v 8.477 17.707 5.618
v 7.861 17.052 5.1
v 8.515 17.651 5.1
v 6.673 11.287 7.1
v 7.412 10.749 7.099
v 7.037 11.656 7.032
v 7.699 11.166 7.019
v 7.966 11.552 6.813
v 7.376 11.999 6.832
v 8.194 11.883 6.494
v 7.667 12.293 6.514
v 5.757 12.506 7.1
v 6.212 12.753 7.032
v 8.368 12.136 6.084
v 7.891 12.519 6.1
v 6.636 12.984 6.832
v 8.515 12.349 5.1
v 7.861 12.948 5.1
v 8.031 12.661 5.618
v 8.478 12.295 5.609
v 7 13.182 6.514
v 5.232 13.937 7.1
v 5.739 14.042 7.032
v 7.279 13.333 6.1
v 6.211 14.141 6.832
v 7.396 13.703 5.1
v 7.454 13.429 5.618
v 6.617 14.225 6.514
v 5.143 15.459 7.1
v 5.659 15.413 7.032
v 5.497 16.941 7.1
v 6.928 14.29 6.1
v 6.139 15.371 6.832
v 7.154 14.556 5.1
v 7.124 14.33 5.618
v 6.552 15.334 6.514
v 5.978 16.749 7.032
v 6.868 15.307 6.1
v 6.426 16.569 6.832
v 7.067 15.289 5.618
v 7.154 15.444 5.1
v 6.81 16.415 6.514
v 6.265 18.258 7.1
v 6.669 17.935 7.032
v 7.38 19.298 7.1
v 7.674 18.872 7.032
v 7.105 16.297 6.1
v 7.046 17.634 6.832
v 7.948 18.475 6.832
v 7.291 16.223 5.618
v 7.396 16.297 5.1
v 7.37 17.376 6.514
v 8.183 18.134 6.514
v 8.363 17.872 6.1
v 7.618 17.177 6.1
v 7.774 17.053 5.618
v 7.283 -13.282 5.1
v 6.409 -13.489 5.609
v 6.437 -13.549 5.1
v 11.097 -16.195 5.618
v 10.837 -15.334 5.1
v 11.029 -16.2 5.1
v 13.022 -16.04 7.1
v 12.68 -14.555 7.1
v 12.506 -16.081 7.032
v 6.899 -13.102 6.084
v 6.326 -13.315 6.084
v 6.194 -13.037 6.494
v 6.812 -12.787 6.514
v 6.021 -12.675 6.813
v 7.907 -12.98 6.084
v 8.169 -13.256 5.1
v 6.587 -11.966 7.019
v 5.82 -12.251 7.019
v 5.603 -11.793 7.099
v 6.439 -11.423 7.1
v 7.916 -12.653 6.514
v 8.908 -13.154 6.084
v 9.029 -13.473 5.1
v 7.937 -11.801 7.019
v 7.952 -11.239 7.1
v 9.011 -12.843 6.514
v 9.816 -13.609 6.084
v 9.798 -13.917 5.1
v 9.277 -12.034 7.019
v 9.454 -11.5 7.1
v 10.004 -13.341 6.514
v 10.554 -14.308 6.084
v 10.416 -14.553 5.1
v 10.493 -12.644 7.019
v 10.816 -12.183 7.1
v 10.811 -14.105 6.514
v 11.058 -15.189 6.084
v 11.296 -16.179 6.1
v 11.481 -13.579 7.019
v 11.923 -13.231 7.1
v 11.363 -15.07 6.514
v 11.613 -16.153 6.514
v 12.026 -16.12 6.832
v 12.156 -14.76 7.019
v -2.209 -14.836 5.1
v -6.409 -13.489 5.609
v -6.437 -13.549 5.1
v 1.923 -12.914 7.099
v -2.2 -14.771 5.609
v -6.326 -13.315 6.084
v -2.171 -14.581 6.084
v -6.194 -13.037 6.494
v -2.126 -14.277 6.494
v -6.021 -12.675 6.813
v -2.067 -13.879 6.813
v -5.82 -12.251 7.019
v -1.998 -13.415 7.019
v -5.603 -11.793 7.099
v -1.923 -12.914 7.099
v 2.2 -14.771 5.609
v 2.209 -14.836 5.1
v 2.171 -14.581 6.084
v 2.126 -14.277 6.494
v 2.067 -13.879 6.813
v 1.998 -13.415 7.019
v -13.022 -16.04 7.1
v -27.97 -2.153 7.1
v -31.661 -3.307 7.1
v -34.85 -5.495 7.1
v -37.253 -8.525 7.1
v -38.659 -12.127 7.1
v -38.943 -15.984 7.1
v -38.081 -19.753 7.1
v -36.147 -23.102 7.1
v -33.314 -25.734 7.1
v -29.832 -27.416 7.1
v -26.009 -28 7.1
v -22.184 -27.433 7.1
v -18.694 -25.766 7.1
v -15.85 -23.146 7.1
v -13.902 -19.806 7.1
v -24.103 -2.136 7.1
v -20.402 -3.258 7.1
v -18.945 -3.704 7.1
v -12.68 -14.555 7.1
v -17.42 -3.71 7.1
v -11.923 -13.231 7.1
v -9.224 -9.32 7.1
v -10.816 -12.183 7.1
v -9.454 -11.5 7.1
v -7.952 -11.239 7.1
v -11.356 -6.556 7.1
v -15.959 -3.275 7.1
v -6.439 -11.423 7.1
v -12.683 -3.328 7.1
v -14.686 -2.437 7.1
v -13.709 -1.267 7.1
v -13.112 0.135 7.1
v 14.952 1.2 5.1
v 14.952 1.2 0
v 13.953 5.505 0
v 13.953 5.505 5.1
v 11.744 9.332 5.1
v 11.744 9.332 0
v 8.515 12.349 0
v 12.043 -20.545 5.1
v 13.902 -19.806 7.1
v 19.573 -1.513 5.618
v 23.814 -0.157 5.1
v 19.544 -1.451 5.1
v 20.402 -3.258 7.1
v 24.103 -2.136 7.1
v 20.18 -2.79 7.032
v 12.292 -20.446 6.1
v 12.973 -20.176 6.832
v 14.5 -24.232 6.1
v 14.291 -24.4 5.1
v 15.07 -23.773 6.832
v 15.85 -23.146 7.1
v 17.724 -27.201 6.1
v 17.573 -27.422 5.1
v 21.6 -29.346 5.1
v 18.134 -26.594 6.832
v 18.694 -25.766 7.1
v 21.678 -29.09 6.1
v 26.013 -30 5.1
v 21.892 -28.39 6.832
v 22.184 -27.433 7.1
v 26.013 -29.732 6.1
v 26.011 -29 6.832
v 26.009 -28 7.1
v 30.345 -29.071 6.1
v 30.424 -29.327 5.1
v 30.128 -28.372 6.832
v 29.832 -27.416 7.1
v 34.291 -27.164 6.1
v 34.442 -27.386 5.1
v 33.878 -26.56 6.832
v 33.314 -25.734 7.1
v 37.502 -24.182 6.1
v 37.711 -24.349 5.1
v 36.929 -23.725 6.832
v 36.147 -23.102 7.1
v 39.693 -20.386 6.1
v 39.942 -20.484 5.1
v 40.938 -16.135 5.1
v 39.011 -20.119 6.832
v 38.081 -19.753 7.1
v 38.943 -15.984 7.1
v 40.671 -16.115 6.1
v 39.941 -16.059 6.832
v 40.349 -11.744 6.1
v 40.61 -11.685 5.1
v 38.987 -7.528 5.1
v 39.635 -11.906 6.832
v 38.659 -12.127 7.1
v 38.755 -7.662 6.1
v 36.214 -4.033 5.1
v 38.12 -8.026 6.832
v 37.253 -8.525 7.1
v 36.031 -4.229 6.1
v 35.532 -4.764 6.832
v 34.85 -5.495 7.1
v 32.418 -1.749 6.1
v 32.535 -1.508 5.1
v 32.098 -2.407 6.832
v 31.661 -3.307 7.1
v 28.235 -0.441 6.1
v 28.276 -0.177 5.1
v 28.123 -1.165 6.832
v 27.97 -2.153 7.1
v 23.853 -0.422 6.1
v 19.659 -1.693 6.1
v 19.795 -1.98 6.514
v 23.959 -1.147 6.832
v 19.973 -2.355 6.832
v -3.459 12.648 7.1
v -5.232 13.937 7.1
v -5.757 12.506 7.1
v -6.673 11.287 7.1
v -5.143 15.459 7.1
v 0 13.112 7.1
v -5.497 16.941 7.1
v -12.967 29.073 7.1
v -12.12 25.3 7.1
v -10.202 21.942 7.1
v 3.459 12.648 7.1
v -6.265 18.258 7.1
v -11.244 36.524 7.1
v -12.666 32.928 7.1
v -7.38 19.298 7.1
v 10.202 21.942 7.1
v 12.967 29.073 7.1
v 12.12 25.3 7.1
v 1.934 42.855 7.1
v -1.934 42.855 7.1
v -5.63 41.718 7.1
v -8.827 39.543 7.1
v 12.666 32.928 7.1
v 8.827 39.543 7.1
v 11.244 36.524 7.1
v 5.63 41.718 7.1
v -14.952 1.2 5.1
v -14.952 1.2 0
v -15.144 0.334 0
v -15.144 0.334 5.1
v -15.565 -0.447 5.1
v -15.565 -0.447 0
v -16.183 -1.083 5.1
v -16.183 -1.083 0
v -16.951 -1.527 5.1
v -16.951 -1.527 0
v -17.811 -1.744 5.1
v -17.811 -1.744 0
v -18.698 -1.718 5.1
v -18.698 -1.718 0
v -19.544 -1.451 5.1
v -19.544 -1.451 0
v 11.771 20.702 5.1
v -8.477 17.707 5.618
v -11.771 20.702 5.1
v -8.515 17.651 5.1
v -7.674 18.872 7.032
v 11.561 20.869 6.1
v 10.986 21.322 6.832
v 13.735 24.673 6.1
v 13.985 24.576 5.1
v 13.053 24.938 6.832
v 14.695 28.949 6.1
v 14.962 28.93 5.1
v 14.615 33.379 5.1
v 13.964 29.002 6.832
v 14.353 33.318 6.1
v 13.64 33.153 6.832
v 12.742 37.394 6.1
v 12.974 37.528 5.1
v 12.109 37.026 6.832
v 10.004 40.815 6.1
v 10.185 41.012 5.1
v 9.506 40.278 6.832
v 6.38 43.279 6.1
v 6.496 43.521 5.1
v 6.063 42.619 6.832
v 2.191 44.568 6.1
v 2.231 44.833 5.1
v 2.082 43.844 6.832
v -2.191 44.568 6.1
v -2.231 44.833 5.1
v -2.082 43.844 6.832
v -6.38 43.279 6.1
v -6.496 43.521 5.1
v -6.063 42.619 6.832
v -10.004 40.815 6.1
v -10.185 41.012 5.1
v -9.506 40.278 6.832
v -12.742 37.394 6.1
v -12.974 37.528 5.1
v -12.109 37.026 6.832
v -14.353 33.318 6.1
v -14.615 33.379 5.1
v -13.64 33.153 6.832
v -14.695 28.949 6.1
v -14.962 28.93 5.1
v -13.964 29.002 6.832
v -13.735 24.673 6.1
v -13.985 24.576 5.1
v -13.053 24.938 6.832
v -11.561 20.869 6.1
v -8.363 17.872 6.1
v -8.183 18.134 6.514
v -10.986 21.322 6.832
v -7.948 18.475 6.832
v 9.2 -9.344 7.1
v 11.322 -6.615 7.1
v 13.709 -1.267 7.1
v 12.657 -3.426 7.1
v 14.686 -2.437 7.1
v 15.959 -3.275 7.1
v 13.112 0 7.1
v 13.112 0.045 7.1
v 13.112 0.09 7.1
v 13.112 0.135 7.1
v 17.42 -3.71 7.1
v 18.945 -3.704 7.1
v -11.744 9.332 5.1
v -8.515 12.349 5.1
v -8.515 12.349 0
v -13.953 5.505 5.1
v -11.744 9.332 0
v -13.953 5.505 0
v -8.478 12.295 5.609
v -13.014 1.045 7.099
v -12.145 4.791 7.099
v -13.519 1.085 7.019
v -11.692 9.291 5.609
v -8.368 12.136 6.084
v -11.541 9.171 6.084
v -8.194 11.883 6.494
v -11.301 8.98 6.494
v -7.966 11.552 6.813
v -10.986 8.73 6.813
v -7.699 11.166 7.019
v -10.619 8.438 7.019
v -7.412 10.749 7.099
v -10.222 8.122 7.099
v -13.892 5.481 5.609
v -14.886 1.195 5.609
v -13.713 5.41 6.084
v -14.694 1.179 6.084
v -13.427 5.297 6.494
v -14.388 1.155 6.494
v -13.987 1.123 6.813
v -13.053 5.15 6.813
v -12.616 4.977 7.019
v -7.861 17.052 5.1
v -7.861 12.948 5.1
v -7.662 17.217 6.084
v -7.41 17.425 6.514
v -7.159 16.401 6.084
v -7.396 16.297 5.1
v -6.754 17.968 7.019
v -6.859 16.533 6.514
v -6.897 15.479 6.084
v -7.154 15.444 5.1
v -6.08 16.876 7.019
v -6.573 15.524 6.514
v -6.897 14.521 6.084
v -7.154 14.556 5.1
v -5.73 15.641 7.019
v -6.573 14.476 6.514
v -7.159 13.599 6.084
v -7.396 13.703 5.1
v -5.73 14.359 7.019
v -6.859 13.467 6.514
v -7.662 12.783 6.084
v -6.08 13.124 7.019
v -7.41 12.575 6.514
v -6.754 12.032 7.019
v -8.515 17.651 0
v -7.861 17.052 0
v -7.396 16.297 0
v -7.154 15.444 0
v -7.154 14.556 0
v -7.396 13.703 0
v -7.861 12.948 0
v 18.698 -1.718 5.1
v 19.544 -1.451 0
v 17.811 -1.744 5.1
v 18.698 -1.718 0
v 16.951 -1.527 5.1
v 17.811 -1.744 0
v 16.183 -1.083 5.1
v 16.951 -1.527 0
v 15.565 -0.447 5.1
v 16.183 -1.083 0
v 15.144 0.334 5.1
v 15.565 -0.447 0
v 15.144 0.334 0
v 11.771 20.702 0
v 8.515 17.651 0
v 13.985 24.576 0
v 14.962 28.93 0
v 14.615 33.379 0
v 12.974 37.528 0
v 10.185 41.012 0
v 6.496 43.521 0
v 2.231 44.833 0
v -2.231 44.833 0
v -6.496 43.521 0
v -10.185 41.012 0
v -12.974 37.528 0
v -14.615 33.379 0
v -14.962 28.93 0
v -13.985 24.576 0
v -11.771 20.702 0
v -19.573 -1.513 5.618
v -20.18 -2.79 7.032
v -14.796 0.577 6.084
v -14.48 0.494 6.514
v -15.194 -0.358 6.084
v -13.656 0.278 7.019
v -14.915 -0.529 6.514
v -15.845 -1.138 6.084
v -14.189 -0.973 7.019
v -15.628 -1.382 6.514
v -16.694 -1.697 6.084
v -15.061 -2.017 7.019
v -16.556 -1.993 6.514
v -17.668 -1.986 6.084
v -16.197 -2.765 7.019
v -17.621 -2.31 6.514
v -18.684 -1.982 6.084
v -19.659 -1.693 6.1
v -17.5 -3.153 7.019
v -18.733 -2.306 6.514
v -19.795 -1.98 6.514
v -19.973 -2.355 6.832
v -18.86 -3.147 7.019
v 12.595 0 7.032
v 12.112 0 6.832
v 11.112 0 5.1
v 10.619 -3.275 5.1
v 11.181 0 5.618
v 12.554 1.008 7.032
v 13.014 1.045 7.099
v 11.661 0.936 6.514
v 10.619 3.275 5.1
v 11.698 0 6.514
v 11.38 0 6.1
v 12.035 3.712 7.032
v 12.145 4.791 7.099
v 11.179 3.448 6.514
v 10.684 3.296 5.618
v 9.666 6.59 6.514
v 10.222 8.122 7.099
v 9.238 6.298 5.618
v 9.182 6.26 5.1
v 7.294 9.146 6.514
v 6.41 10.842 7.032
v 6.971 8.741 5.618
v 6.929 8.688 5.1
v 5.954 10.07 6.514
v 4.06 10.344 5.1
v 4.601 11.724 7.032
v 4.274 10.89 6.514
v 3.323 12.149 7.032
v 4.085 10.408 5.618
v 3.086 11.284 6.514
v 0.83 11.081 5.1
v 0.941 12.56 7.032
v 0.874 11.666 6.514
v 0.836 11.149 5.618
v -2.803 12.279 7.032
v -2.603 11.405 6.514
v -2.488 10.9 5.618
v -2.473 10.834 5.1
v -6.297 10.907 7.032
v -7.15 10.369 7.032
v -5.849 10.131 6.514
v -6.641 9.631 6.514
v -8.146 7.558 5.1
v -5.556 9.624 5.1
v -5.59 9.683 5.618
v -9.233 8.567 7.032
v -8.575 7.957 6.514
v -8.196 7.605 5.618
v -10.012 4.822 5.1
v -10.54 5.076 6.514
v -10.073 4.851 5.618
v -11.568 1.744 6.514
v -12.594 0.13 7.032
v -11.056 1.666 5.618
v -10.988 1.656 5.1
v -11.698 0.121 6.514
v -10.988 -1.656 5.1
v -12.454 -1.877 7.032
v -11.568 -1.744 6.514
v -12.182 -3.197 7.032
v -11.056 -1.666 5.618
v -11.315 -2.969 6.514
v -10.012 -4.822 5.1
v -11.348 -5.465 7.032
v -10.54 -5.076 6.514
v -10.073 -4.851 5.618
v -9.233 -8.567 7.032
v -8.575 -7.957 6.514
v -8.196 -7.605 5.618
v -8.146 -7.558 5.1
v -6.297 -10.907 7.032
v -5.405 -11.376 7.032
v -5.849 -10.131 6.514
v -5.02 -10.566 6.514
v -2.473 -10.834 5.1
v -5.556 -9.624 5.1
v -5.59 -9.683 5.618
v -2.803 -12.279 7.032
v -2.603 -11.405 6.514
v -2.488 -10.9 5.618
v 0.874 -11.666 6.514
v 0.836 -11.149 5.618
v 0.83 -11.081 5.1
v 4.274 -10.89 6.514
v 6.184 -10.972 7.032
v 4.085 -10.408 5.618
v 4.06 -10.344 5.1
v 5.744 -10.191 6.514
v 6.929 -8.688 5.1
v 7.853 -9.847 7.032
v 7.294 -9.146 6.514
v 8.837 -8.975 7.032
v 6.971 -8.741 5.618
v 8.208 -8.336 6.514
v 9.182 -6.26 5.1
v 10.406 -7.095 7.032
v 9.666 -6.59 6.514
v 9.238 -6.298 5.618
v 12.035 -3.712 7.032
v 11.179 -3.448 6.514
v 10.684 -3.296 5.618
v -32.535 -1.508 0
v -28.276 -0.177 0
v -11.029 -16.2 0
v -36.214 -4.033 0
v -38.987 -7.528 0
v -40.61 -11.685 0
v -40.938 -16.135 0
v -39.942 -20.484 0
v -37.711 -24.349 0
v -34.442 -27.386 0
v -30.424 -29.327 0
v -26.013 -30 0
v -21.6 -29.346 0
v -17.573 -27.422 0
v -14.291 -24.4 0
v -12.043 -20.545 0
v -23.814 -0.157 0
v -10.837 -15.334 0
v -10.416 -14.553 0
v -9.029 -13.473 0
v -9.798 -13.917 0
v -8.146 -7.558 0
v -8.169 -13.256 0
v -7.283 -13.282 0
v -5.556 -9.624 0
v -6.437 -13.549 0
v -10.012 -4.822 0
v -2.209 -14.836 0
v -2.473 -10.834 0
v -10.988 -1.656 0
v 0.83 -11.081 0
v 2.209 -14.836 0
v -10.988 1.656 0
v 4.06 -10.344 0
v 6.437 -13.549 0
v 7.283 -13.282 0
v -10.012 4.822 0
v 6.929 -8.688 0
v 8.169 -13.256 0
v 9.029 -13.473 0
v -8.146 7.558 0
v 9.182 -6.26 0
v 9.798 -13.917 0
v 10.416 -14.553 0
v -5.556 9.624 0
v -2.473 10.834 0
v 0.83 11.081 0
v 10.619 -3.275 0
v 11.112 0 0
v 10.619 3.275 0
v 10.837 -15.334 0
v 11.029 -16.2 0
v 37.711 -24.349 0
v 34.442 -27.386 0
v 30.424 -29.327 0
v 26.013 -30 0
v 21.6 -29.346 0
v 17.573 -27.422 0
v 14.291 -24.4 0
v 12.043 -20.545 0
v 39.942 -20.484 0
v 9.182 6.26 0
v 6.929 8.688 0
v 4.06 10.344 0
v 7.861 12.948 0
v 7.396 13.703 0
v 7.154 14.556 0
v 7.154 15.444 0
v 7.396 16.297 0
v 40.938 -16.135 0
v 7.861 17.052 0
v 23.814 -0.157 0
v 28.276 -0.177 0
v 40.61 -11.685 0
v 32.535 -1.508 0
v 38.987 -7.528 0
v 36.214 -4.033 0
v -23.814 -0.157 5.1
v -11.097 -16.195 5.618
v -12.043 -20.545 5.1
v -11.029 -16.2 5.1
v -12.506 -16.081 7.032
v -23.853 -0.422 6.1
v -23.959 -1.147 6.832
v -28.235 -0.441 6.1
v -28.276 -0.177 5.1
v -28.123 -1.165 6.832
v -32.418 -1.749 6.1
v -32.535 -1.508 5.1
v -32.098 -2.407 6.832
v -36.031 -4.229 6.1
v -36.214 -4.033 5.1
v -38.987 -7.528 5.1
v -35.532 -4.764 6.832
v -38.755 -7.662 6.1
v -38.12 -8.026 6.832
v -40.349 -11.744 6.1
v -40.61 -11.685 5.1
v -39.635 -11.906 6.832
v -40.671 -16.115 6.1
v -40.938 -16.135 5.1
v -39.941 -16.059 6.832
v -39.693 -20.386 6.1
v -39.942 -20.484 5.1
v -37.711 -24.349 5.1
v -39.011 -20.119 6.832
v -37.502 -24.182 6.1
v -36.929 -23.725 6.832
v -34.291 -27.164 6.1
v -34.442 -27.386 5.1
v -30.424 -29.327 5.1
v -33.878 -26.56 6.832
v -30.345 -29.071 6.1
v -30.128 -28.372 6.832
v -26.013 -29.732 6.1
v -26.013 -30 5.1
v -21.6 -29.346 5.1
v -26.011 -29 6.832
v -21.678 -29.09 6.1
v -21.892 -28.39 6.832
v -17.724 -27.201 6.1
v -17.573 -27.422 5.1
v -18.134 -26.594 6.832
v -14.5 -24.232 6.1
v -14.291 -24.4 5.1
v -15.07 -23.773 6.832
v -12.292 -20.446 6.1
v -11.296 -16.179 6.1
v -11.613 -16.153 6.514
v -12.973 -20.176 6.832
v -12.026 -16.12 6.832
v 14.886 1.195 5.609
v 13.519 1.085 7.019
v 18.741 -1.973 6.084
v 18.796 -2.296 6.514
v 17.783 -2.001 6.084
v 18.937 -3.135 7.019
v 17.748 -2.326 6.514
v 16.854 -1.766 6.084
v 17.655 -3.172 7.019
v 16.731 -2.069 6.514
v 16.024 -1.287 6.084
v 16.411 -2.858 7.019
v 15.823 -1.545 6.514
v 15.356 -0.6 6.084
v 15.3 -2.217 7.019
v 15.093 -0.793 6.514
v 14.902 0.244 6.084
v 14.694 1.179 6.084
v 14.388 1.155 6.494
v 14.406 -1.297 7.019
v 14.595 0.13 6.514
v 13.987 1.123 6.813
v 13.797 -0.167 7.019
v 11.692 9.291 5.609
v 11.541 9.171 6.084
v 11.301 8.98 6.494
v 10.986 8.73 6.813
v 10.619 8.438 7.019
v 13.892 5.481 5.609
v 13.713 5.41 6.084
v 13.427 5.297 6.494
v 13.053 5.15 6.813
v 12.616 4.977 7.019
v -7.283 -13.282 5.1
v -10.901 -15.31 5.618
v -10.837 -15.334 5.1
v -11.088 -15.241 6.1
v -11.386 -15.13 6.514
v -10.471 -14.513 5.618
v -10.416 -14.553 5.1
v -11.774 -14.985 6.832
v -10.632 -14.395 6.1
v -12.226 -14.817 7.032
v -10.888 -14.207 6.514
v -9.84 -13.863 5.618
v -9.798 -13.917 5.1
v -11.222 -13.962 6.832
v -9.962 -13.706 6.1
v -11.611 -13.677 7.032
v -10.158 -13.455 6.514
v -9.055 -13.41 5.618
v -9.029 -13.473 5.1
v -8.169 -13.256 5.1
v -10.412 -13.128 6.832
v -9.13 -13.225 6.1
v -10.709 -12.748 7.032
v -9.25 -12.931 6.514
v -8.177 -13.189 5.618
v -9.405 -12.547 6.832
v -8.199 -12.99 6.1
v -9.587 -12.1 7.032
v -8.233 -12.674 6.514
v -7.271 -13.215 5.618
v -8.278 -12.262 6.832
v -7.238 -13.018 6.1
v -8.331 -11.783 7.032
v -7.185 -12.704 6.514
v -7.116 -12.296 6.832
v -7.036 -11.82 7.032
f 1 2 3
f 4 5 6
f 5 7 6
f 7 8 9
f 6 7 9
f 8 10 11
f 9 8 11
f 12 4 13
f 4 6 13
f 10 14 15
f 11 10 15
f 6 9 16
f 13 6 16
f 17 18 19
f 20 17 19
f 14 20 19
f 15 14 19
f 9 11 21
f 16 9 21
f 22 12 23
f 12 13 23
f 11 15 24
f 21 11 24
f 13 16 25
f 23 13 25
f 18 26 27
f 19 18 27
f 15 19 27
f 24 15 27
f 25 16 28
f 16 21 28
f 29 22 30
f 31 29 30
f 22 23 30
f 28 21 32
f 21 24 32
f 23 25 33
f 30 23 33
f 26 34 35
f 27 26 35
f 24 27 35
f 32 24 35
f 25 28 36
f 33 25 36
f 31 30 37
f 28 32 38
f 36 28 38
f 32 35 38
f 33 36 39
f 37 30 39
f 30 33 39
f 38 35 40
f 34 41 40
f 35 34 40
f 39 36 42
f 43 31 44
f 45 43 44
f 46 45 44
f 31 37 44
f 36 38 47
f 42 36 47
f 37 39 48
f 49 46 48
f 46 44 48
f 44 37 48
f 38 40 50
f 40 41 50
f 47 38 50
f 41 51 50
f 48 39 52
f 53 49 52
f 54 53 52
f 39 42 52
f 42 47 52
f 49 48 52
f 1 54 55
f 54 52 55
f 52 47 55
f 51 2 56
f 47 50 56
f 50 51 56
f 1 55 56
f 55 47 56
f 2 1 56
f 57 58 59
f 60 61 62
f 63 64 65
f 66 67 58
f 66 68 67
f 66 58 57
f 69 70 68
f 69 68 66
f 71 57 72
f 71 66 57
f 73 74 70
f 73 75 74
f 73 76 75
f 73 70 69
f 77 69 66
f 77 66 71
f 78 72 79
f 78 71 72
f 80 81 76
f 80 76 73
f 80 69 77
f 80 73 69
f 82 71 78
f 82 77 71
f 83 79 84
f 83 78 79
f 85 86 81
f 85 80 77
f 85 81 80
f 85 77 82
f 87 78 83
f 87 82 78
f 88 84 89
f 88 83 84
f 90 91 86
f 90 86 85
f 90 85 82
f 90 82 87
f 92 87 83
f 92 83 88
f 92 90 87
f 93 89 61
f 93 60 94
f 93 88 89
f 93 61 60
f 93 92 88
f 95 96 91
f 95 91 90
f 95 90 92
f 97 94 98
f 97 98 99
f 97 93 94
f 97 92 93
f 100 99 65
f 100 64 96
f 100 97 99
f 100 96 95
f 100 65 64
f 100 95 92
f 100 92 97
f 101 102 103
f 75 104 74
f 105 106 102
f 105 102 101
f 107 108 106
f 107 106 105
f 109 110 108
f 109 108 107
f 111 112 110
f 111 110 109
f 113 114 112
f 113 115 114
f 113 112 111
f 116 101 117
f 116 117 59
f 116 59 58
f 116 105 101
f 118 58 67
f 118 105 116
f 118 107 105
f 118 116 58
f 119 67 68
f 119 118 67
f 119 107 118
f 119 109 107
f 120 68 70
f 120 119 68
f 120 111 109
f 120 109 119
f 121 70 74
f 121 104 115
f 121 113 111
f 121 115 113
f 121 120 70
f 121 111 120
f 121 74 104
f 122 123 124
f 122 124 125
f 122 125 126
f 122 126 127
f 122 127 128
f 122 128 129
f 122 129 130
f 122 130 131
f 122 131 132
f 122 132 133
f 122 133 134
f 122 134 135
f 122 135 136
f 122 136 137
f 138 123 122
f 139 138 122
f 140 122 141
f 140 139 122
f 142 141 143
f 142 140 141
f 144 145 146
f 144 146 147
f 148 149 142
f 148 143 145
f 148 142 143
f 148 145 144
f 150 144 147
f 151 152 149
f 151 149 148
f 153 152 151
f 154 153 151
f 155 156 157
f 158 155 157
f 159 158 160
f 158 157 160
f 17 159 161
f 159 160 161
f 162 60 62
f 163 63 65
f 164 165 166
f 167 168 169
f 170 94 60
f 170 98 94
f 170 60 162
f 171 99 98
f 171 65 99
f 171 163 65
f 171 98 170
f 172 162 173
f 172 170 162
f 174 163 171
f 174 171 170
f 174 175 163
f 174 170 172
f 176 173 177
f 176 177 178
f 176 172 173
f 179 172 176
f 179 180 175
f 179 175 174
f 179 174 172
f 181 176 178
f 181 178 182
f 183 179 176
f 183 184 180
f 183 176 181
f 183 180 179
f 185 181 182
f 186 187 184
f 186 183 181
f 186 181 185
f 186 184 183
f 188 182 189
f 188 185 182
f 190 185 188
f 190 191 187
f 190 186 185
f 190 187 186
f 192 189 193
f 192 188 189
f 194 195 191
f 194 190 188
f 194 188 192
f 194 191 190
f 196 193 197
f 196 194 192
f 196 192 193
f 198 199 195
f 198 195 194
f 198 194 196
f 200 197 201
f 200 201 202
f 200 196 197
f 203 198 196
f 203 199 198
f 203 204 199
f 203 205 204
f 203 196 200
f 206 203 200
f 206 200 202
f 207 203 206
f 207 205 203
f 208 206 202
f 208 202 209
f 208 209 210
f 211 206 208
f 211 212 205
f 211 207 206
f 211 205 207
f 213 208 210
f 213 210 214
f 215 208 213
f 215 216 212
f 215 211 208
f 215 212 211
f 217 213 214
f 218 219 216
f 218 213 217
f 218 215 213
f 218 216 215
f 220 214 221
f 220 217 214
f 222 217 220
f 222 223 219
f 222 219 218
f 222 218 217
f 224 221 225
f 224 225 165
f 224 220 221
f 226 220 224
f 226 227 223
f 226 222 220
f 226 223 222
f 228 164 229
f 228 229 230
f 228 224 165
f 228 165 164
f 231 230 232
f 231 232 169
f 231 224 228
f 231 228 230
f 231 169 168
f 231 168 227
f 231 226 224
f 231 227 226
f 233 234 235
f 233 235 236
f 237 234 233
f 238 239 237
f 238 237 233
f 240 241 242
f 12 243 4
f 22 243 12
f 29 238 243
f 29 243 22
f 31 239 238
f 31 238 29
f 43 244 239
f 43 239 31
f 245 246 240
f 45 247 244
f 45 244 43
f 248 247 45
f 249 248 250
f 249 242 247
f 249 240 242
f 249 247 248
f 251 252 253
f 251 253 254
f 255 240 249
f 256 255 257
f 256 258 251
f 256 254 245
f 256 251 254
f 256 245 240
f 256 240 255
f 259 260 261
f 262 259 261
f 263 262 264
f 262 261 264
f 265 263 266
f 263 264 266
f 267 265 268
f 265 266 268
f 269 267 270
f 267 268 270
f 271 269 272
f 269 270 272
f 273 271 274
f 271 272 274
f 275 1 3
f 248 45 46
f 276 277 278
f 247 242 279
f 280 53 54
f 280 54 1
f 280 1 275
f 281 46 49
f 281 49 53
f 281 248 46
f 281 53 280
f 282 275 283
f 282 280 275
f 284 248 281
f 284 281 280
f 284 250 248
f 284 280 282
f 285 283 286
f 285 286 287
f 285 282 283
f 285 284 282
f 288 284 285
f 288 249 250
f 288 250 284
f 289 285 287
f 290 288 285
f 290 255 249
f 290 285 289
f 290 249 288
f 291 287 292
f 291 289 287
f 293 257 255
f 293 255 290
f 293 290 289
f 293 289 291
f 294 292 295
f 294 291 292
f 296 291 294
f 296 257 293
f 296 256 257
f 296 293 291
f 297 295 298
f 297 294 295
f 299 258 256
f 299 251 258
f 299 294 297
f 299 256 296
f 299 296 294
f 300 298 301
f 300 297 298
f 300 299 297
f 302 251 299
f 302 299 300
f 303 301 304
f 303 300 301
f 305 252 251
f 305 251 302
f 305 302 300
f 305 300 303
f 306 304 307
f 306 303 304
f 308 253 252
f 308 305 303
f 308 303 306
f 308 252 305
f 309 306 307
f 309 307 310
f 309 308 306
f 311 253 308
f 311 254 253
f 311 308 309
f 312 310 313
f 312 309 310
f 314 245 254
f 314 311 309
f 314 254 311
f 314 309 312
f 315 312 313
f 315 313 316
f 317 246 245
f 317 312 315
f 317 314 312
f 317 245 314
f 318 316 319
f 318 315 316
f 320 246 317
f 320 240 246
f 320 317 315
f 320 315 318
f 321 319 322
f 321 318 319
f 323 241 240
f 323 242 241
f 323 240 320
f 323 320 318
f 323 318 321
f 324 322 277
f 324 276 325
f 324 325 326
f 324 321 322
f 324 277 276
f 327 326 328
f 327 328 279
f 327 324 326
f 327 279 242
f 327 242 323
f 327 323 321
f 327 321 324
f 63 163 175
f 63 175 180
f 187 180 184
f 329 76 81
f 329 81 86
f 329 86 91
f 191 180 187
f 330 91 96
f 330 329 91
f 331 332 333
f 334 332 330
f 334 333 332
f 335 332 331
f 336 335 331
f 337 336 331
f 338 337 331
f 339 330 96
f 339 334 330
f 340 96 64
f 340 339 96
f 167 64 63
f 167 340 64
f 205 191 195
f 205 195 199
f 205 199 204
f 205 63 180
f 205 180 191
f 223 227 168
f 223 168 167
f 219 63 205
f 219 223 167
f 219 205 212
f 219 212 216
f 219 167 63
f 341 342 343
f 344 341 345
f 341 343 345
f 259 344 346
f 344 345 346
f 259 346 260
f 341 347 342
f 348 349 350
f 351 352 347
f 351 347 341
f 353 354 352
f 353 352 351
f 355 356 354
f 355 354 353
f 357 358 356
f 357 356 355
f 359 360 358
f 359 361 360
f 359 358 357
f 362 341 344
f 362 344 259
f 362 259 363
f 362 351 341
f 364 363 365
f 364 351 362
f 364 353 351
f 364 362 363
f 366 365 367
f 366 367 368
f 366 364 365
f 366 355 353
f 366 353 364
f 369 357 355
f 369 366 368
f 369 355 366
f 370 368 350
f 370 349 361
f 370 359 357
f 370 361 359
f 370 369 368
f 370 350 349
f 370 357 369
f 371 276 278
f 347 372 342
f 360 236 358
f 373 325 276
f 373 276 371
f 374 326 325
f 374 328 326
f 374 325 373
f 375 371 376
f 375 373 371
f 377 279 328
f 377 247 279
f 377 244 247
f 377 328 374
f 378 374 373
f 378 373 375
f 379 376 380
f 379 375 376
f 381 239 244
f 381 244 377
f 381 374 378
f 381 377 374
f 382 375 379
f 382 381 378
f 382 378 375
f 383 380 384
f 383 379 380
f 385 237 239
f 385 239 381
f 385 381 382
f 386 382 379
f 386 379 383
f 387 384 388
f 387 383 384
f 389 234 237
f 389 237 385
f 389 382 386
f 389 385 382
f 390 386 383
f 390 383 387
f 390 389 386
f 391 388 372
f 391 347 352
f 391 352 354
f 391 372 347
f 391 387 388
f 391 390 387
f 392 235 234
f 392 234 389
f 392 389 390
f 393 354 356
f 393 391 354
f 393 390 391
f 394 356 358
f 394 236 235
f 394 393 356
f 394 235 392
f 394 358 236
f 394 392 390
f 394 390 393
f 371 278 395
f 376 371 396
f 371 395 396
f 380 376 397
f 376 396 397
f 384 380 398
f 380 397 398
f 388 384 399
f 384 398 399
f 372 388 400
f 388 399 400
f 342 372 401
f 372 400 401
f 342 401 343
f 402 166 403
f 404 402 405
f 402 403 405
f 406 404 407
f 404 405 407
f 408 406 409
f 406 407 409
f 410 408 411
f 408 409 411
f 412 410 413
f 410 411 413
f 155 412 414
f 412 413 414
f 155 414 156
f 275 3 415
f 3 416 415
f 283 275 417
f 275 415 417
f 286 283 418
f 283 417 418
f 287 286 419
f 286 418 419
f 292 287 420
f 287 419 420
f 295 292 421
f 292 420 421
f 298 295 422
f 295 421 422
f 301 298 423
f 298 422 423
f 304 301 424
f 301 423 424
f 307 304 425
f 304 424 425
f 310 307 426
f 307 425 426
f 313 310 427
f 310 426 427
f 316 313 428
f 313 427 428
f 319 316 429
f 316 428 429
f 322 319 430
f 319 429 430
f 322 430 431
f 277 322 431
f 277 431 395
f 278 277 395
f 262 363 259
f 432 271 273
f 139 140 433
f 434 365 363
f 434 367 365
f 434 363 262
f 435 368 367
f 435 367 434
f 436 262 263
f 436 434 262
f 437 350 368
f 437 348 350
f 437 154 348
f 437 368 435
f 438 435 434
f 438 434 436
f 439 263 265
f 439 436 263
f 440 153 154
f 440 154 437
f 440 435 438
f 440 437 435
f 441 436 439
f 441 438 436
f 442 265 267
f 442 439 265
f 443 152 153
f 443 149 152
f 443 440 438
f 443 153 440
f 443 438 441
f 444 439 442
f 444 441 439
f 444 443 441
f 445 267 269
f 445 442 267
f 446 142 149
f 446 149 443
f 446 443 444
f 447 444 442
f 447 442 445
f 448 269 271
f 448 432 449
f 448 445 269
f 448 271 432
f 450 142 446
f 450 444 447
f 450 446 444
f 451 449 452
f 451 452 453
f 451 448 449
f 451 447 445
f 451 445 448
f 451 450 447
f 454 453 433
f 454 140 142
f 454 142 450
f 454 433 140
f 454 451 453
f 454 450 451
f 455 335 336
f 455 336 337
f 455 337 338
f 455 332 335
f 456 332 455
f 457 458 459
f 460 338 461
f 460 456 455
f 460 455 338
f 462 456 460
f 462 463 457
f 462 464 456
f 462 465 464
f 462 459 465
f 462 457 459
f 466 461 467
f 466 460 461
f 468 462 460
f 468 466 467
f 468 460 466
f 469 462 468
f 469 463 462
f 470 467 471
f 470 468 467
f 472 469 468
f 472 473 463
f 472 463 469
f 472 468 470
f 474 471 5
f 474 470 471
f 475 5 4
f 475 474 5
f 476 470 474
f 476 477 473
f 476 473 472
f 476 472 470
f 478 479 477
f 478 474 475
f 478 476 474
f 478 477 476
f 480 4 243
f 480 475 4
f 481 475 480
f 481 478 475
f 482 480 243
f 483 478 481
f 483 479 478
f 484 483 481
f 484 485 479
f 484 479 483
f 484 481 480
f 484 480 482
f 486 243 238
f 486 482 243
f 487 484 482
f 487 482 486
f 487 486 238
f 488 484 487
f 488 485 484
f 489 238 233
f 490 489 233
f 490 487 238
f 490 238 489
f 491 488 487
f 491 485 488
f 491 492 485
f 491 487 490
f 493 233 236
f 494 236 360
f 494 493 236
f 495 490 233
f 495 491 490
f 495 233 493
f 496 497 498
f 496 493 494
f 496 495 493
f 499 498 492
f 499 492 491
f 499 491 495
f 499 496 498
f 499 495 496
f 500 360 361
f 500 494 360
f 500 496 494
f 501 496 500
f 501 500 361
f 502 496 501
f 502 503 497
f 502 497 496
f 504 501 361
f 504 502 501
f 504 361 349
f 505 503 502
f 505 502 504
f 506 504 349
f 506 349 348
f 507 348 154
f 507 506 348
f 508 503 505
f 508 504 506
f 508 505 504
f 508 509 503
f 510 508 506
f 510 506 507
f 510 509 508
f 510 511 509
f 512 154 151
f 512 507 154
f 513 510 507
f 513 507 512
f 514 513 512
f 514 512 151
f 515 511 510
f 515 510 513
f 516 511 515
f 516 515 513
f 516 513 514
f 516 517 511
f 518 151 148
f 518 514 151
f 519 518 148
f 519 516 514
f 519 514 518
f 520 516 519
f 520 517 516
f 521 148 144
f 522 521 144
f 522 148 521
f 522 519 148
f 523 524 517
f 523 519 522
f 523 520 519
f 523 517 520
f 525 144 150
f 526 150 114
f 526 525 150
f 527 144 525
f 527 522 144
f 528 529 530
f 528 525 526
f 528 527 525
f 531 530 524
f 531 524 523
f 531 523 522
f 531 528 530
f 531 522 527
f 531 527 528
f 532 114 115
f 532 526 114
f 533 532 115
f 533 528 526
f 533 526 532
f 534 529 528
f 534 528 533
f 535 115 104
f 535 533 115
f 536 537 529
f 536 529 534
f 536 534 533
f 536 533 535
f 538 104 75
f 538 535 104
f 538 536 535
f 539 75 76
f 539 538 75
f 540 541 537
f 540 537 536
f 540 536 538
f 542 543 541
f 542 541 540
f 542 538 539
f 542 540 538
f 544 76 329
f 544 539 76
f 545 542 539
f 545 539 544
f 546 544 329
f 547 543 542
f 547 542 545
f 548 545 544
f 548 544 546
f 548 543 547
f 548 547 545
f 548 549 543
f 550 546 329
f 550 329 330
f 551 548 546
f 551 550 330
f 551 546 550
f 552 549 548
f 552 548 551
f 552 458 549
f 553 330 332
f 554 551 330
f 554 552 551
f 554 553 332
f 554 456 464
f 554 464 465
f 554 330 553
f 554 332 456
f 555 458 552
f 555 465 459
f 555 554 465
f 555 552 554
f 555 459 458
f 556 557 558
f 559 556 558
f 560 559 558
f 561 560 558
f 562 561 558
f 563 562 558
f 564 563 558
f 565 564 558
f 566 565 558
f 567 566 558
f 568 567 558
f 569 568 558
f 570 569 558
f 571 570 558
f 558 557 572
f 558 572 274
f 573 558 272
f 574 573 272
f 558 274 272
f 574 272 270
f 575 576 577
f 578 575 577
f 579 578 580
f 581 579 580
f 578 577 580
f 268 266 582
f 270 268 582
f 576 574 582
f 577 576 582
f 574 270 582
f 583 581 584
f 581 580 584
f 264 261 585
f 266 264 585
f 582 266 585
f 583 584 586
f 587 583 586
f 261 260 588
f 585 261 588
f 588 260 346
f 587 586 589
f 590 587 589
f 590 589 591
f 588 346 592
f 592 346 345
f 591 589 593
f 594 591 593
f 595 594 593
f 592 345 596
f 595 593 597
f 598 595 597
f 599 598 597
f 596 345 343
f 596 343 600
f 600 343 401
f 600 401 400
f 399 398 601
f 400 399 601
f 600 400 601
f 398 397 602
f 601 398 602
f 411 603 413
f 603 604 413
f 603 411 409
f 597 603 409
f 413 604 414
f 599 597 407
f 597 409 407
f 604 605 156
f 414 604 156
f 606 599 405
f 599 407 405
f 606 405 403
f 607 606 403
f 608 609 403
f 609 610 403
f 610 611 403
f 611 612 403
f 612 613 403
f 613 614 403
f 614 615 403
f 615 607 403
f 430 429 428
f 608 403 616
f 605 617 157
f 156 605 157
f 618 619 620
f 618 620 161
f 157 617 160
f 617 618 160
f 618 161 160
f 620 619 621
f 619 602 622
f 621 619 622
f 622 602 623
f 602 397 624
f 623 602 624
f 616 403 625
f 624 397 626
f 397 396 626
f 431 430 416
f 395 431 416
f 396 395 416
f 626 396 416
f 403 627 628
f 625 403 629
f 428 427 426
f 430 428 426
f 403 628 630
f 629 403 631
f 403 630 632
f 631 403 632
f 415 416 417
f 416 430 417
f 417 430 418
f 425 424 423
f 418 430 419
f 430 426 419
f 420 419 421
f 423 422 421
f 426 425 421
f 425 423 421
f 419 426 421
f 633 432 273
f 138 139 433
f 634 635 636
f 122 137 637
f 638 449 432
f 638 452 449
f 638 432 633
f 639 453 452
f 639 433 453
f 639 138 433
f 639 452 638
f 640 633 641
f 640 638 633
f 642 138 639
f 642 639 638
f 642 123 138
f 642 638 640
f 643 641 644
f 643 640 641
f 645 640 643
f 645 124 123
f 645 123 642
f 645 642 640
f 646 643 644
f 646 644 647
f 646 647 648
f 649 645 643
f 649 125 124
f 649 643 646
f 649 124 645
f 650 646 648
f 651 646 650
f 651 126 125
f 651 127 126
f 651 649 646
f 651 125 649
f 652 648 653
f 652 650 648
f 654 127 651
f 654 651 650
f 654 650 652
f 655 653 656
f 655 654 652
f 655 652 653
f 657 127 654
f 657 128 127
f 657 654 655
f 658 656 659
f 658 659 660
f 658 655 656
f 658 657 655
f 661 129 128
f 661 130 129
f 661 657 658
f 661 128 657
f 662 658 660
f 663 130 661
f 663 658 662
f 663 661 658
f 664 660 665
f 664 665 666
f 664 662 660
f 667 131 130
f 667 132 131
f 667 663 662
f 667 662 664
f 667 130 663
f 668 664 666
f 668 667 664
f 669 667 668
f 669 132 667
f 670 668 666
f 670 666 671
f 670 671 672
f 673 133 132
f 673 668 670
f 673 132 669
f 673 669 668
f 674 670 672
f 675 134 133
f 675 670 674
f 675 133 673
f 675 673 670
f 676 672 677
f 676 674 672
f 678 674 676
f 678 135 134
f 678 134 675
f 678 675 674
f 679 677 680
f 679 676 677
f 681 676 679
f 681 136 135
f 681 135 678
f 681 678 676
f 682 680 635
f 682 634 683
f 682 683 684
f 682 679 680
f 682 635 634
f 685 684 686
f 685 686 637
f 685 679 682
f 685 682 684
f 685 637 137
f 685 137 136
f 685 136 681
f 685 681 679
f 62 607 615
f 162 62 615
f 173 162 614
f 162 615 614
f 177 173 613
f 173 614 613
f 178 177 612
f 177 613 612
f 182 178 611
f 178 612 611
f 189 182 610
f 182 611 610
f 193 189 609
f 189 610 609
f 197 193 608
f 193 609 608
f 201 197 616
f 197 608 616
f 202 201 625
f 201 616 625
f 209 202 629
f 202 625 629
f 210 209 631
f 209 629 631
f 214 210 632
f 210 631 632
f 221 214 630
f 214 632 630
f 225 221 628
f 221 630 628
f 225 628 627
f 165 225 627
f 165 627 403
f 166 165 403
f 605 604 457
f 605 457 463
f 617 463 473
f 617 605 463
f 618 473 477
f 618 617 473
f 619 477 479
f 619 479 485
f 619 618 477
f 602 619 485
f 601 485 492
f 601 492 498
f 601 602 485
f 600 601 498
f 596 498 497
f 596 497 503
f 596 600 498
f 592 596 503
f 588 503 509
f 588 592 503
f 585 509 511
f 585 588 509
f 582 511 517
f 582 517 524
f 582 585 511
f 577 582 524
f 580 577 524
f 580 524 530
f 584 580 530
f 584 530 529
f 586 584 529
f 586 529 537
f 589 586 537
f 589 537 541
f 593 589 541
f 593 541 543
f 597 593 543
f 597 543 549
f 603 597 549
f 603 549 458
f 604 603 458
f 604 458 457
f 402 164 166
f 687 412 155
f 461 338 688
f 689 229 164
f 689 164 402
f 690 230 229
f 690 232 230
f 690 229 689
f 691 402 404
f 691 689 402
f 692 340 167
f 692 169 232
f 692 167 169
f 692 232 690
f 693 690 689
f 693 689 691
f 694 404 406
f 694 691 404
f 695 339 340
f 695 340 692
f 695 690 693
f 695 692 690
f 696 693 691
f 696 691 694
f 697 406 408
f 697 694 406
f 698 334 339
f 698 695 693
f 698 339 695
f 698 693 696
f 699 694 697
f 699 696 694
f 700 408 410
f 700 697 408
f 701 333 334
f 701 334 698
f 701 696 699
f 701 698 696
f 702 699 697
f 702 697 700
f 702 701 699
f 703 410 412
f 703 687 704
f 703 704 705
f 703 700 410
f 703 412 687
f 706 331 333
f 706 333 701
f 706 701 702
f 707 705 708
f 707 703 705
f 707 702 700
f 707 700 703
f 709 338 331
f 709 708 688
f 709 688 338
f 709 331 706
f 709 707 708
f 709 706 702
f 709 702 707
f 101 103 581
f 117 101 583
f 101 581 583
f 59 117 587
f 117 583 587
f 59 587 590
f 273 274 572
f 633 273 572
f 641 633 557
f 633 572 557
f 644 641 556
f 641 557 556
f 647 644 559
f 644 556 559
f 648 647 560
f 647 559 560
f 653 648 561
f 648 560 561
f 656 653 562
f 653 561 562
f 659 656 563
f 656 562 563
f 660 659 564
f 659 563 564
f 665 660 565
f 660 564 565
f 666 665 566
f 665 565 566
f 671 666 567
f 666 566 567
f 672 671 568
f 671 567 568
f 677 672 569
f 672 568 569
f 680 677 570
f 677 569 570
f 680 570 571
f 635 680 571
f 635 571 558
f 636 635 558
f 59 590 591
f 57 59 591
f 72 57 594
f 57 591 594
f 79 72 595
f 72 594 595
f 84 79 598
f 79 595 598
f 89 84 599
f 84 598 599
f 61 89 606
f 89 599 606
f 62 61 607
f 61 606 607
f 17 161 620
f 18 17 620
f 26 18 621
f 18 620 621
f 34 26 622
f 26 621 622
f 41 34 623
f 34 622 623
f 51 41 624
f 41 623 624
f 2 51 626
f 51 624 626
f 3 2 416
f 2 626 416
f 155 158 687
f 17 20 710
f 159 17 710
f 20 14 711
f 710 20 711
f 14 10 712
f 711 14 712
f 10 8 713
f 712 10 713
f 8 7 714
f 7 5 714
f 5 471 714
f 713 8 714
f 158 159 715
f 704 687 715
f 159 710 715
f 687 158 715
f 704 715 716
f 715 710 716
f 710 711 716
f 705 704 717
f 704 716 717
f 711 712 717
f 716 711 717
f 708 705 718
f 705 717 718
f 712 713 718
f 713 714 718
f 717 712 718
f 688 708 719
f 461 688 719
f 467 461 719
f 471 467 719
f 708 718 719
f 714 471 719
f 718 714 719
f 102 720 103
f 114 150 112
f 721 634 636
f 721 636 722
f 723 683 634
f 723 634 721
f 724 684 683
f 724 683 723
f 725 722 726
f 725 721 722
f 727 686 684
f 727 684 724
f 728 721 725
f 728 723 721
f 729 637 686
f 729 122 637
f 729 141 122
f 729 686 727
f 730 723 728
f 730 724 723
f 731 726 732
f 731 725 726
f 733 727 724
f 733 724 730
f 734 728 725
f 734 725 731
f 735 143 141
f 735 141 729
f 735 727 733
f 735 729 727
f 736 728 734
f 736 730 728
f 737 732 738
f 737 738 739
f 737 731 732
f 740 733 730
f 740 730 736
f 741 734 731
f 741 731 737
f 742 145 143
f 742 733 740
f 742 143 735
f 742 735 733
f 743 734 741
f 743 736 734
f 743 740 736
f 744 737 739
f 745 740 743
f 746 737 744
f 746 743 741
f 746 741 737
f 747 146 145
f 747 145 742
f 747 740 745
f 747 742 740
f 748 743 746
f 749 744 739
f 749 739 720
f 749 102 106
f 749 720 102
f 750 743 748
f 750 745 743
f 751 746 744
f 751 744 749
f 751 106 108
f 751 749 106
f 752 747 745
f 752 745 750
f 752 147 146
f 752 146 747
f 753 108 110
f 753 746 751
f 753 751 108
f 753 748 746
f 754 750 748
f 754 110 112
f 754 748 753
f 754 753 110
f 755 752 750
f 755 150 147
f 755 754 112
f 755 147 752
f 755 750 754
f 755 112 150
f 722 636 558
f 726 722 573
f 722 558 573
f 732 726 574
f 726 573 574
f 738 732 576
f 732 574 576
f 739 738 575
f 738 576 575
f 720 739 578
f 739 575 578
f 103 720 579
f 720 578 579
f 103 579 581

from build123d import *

# Parameters (mm, degrees)
F0_R         = 15
F0_R_2       = 11.1125
F1_DEPTH     = 7.1
F2_R         = 15
F3_DEPTH     = 7.1
F5_DEPTH     = 7.1
F6_T2_ANGLE  = 50.822828172
F6_T4_ANGLE  = 110.822828172
F6_T6_ANGLE  = 290.822828172
F6_T8_ANGLE  = 110.822828172
F6_T10_ANGLE = 50.822828172
F6_T12_ANGLE = 110.822828172
F6_T14_ANGLE = 290.822828172
F6_T16_ANGLE = 110.822828172
F6_T18_ANGLE = 50.822828172
F6_T20_ANGLE = 110.822828172
F6_T22_ANGLE = 290.822828172
F6_T24_ANGLE = 110.822828172


# Not quite as in the source:
# - a fillet or chamfer that OpenCascade refuses, or shapes differently, is made with other operations: its cross-section is extruded or revolved along the edge and cut away or added


with BuildPart() as f1:
    # F0 (on Top) → F1 (new body)
    with BuildSketch(Plane.XY):
        Circle(F0_R)
        Circle(F0_R_2, mode=Mode.SUBTRACT)
    extrude(amount=F1_DEPTH)

    # F2 (on Top) → F3 (join)
    with BuildSketch(Plane.XY):
        with Locations((0, 30)):
            Circle(F2_R)
        with Locations((-25.9807621135, -15)):
            Circle(F2_R)
        with Locations((25.9807621135, -15)):
            Circle(F2_R)
    extrude(amount=F3_DEPTH)

    # F4 (on Top) → F5 (join)
    with BuildSketch(Plane.XY):
        with BuildLine():
            ThreePointArc((8.5151963101, 17.6512578859), (4.459196579, 15.6781437701), (-3.4e-09, 15))
            ThreePointArc((-3.4e-09, 15), (4.459196579, 14.3218562299), (8.5151963101, 12.3487421141))
            ThreePointArc((8.5151963101, 12.3487421141), (7.1229179094, 15), (8.5151963101, 17.6512578859))
        make_face()
        with BuildLine():
            ThreePointArc((-8.5151963101, 17.6512578859), (-7.1229179094, 15), (-8.5151963101, 12.3487421141))
            ThreePointArc((-8.5151963101, 12.3487421141), (-4.4591965822, 14.3218562289), (-3.4e-09, 15))
            ThreePointArc((-3.4e-09, 15), (-4.4591965822, 15.6781437711), (-8.5151963101, 17.6512578859))
        make_face()
        with BuildLine():
            ThreePointArc((-12.9903811554, -7.4999998292), (-14.632689636, -3.2991504992), (-14.9519225306, 1.2000052657))
            ThreePointArc((-14.9519225306, 1.2000052657), (-16.5518400115, -1.3313721414), (-19.544035893, -1.4512526202))
            ThreePointArc((-19.544035893, -1.4512526202), (-15.8072691523, -3.9772942992), (-12.9903811554, -7.4999998292))
        make_face()
        with BuildLine():
            ThreePointArc((-6.4367262205, -13.5487473798), (-10.1734931062, -11.0227055671), (-12.9903811554, -7.4999998292))
            ThreePointArc((-12.9903811554, -7.4999998292), (-11.3480725209, -11.7008493083), (-11.0288395829, -16.2000052657))
            ThreePointArc((-11.0288395829, -16.2000052657), (-9.4289221021, -13.6686278586), (-6.4367262205, -13.5487473798))
        make_face()
        with BuildLine():
            ThreePointArc((12.9903809901, -7.5000001155), (10.1734929847, -11.0227056792), (6.4367262205, -13.5487473798))
            ThreePointArc((6.4367262205, -13.5487473798), (9.4289221021, -13.6686278586), (11.0288395829, -16.2000052657))
            ThreePointArc((11.0288395829, -16.2000052657), (11.3480724846, -11.7008494696), (12.9903809901, -7.5000001155))
        make_face()
        with BuildLine():
            ThreePointArc((14.9519225306, 1.2000052657), (14.6326895996, -3.2991506605), (12.9903809901, -7.5000001155))
            ThreePointArc((12.9903809901, -7.5000001155), (15.8072690308, -3.9772944113), (19.544035893, -1.4512526202))
            ThreePointArc((19.544035893, -1.4512526202), (16.5518400115, -1.3313721414), (14.9519225306, 1.2000052657))
        make_face()
    extrude(amount=F5_DEPTH)

    # F6: fillet of radius 2 on 13 edges, made by hand

    # F6_s1 → F6_t2 (revolve, cut)
    with BuildSketch(Plane(origin=(0, 0, 0), x_dir=(0, 0, 1), z_dir=(-0.8232494743, 0.567679754, 0))):
        with BuildLine():
            ThreePointArc((5.1, 15), (6.5142135624, 14.4142135624), (7.1, 13))
            Line((7.1, 13), (7.1, 15))
            Line((7.1, 15), (5.1, 15))
        make_face()
    revolve(axis=Axis((0, 0, 7.1), (0, 0, -1)), revolution_arc=F6_T2_ANGLE, mode=Mode.SUBTRACT)

    # F6_s3 → F6_t4 (revolve, cut)
    with BuildSketch(Plane(origin=(0, 0, 0), x_dir=(0, 0, 1), z_dir=(0.8232494743, -0.567679754, 0))):
        with BuildLine():
            ThreePointArc((7.1, -13), (6.5142135624, -14.4142135624), (5.1, -15))
            Line((5.1, -15), (7.1, -15))
            Line((7.1, -15), (7.1, -13))
        make_face()
    revolve(axis=Axis((10.3433972036, 15, 7.1), (0, 0, -1)), revolution_arc=F6_T4_ANGLE, mode=Mode.SUBTRACT)

    # F6_s5 → F6_t6 (revolve, cut)
    with BuildSketch(Plane(origin=(14.0202617712, 9.6678090933, 0), x_dir=(0, 0, 1), z_dir=(-0.8232494743, -0.567679754, 0))):
        with BuildLine():
            ThreePointArc((5.1, 9.6974842282), (6.5142135624, 10.2832706658), (7.1, 11.6974842282))
            Line((7.1, 11.6974842282), (7.1, 9.6974842282))
            Line((7.1, 9.6974842282), (5.1, 9.6974842282))
        make_face()
    revolve(axis=Axis((0, 30, 7.1), (0, 0, 1)), revolution_arc=F6_T6_ANGLE, mode=Mode.SUBTRACT)

    # F6_s7 → F6_t8 (revolve, cut)
    with BuildSketch(Plane(origin=(-14.0202617712, 9.6678090933, 0), x_dir=(0, 0, 1), z_dir=(-0.8232494743, 0.567679754, 0))):
        with BuildLine():
            ThreePointArc((5.1, 9.6974842282), (6.5142135624, 10.2832706658), (7.1, 11.6974842282))
            Line((7.1, 11.6974842282), (7.1, 9.6974842282))
            Line((7.1, 9.6974842282), (5.1, 9.6974842282))
        make_face()
    revolve(axis=Axis((-10.3433972036, 15, 7.1), (0, 0, -1)), revolution_arc=F6_T8_ANGLE, mode=Mode.SUBTRACT)

    # F6_s9 → F6_t10 (revolve, cut)
    with BuildSketch(Plane(origin=(0, 0, 0), x_dir=(0, 0, 1), z_dir=(0.8232494743, 0.567679754, 0))):
        with BuildLine():
            ThreePointArc((5.1, -15), (6.5142135624, -14.4142135624), (7.1, -13))
            Line((7.1, -13), (7.1, -15))
            Line((7.1, -15), (5.1, -15))
        make_face()
    revolve(axis=Axis((0, 0, 7.1), (0, 0, 1)), revolution_arc=F6_T10_ANGLE, mode=Mode.SUBTRACT)

    # F6_s11 → F6_t12 (revolve, cut)
    with BuildSketch(Plane(origin=(0, 0, 0), x_dir=(0, 0, 1), z_dir=(0.080000351, 0.9967948354, 0))):
        with BuildLine():
            ThreePointArc((5.1, -15), (6.5142135624, -14.4142135624), (7.1, -13))
            Line((7.1, -13), (7.1, -15))
            Line((7.1, -15), (5.1, -15))
        make_face()
    revolve(axis=Axis((-18.1620796586, 1.4576447398, 7.1), (0, 0, -1)), revolution_arc=F6_T12_ANGLE, mode=Mode.SUBTRACT)

    # F6_s13 → F6_t14 (revolve, cut)
    with BuildSketch(Plane(origin=(-15.3826991593, 7.307998315, 0), x_dir=(0, 0, 1), z_dir=(0.9032498253, -0.4291150814, 0))):
        with BuildLine():
            ThreePointArc((5.1, 9.6974842282), (6.5142135624, 10.2832706658), (7.1, 11.6974842282))
            Line((7.1, 11.6974842282), (7.1, 9.6974842282))
            Line((7.1, 9.6974842282), (5.1, 9.6974842282))
        make_face()
    revolve(axis=Axis((-25.9807621135, -15, 7.1), (0, 0, 1)), revolution_arc=F6_T14_ANGLE, mode=Mode.SUBTRACT)

    # F6_s15 → F6_t16 (revolve, cut)
    with BuildSketch(Plane(origin=(-1.3624373881, -16.9758074082, 0), x_dir=(0, 0, 1), z_dir=(-0.080000351, -0.9967948354, 0))):
        with BuildLine():
            ThreePointArc((5.1, 9.6974842282), (6.5142135624, 10.2832706658), (7.1, 11.6974842282))
            Line((7.1, 11.6974842282), (7.1, 9.6974842282))
            Line((7.1, 9.6974842282), (5.1, 9.6974842282))
        make_face()
    revolve(axis=Axis((-7.8186824549, -16.4576447398, 7.1), (0, 0, -1)), revolution_arc=F6_T16_ANGLE, mode=Mode.SUBTRACT)

    # F6_s17 → F6_t18 (revolve, cut)
    with BuildSketch(Plane(origin=(0, 0, 0), x_dir=(0, 0, 1), z_dir=(-0.9032498253, 0.4291150814, 0))):
        with BuildLine():
            ThreePointArc((5.1, -15), (6.5142135624, -14.4142135624), (7.1, -13))
            Line((7.1, -13), (7.1, -15))
            Line((7.1, -15), (5.1, -15))
        make_face()
    revolve(axis=Axis((0, 0, 7.1), (0, 0, 1)), revolution_arc=F6_T18_ANGLE, mode=Mode.SUBTRACT)

    # F6_s19 → F6_t20 (revolve, cut)
    with BuildSketch(Plane(origin=(0, 0, 0), x_dir=(0, 0, 1), z_dir=(-0.9032498253, -0.4291150814, 0))):
        with BuildLine():
            ThreePointArc((5.1, -15), (6.5142135624, -14.4142135624), (7.1, -13))
            Line((7.1, -13), (7.1, -15))
            Line((7.1, -15), (5.1, -15))
        make_face()
    revolve(axis=Axis((7.8186824549, -16.4576447398, 7.1), (0, 0, -1)), revolution_arc=F6_T20_ANGLE, mode=Mode.SUBTRACT)

    # F6_s21 → F6_t22 (revolve, cut)
    with BuildSketch(Plane(origin=(1.3624373881, -16.9758074082, 0), x_dir=(0, 0, 1), z_dir=(-0.080000351, 0.9967948354, 0))):
        with BuildLine():
            ThreePointArc((5.1, 9.6974842282), (6.5142135624, 10.2832706658), (7.1, 11.6974842282))
            Line((7.1, 11.6974842282), (7.1, 9.6974842282))
            Line((7.1, 9.6974842282), (5.1, 9.6974842282))
        make_face()
    revolve(axis=Axis((25.9807621135, -15, 7.1), (0, 0, 1)), revolution_arc=F6_T22_ANGLE, mode=Mode.SUBTRACT)

    # F6_s23 → F6_t24 (revolve, cut)
    with BuildSketch(Plane(origin=(15.3826991593, 7.307998315, 0), x_dir=(0, 0, 1), z_dir=(0.9032498253, 0.4291150814, 0))):
        with BuildLine():
            ThreePointArc((5.1, 9.6974842282), (6.5142135624, 10.2832706658), (7.1, 11.6974842282))
            Line((7.1, 11.6974842282), (7.1, 9.6974842282))
            Line((7.1, 9.6974842282), (5.1, 9.6974842282))
        make_face()
    revolve(axis=Axis((18.1620796586, 1.4576447398, 7.1), (0, 0, -1)), revolution_arc=F6_T24_ANGLE, mode=Mode.SUBTRACT)

    # F6_s25 → F6_t26 (revolve, cut)
    with BuildSketch(Plane.XZ):
        with BuildLine():
            ThreePointArc((13.1125, 7.1), (11.6982864376, 6.5142135624), (11.1125, 5.1))
            Line((11.1125, 5.1), (11.1125, 7.1))
            Line((11.1125, 7.1), (13.1125, 7.1))
        make_face()
    revolve(axis=Axis((0, 0, 7.1), (0, 0, 1)), mode=Mode.SUBTRACT)


solid = f1.part
